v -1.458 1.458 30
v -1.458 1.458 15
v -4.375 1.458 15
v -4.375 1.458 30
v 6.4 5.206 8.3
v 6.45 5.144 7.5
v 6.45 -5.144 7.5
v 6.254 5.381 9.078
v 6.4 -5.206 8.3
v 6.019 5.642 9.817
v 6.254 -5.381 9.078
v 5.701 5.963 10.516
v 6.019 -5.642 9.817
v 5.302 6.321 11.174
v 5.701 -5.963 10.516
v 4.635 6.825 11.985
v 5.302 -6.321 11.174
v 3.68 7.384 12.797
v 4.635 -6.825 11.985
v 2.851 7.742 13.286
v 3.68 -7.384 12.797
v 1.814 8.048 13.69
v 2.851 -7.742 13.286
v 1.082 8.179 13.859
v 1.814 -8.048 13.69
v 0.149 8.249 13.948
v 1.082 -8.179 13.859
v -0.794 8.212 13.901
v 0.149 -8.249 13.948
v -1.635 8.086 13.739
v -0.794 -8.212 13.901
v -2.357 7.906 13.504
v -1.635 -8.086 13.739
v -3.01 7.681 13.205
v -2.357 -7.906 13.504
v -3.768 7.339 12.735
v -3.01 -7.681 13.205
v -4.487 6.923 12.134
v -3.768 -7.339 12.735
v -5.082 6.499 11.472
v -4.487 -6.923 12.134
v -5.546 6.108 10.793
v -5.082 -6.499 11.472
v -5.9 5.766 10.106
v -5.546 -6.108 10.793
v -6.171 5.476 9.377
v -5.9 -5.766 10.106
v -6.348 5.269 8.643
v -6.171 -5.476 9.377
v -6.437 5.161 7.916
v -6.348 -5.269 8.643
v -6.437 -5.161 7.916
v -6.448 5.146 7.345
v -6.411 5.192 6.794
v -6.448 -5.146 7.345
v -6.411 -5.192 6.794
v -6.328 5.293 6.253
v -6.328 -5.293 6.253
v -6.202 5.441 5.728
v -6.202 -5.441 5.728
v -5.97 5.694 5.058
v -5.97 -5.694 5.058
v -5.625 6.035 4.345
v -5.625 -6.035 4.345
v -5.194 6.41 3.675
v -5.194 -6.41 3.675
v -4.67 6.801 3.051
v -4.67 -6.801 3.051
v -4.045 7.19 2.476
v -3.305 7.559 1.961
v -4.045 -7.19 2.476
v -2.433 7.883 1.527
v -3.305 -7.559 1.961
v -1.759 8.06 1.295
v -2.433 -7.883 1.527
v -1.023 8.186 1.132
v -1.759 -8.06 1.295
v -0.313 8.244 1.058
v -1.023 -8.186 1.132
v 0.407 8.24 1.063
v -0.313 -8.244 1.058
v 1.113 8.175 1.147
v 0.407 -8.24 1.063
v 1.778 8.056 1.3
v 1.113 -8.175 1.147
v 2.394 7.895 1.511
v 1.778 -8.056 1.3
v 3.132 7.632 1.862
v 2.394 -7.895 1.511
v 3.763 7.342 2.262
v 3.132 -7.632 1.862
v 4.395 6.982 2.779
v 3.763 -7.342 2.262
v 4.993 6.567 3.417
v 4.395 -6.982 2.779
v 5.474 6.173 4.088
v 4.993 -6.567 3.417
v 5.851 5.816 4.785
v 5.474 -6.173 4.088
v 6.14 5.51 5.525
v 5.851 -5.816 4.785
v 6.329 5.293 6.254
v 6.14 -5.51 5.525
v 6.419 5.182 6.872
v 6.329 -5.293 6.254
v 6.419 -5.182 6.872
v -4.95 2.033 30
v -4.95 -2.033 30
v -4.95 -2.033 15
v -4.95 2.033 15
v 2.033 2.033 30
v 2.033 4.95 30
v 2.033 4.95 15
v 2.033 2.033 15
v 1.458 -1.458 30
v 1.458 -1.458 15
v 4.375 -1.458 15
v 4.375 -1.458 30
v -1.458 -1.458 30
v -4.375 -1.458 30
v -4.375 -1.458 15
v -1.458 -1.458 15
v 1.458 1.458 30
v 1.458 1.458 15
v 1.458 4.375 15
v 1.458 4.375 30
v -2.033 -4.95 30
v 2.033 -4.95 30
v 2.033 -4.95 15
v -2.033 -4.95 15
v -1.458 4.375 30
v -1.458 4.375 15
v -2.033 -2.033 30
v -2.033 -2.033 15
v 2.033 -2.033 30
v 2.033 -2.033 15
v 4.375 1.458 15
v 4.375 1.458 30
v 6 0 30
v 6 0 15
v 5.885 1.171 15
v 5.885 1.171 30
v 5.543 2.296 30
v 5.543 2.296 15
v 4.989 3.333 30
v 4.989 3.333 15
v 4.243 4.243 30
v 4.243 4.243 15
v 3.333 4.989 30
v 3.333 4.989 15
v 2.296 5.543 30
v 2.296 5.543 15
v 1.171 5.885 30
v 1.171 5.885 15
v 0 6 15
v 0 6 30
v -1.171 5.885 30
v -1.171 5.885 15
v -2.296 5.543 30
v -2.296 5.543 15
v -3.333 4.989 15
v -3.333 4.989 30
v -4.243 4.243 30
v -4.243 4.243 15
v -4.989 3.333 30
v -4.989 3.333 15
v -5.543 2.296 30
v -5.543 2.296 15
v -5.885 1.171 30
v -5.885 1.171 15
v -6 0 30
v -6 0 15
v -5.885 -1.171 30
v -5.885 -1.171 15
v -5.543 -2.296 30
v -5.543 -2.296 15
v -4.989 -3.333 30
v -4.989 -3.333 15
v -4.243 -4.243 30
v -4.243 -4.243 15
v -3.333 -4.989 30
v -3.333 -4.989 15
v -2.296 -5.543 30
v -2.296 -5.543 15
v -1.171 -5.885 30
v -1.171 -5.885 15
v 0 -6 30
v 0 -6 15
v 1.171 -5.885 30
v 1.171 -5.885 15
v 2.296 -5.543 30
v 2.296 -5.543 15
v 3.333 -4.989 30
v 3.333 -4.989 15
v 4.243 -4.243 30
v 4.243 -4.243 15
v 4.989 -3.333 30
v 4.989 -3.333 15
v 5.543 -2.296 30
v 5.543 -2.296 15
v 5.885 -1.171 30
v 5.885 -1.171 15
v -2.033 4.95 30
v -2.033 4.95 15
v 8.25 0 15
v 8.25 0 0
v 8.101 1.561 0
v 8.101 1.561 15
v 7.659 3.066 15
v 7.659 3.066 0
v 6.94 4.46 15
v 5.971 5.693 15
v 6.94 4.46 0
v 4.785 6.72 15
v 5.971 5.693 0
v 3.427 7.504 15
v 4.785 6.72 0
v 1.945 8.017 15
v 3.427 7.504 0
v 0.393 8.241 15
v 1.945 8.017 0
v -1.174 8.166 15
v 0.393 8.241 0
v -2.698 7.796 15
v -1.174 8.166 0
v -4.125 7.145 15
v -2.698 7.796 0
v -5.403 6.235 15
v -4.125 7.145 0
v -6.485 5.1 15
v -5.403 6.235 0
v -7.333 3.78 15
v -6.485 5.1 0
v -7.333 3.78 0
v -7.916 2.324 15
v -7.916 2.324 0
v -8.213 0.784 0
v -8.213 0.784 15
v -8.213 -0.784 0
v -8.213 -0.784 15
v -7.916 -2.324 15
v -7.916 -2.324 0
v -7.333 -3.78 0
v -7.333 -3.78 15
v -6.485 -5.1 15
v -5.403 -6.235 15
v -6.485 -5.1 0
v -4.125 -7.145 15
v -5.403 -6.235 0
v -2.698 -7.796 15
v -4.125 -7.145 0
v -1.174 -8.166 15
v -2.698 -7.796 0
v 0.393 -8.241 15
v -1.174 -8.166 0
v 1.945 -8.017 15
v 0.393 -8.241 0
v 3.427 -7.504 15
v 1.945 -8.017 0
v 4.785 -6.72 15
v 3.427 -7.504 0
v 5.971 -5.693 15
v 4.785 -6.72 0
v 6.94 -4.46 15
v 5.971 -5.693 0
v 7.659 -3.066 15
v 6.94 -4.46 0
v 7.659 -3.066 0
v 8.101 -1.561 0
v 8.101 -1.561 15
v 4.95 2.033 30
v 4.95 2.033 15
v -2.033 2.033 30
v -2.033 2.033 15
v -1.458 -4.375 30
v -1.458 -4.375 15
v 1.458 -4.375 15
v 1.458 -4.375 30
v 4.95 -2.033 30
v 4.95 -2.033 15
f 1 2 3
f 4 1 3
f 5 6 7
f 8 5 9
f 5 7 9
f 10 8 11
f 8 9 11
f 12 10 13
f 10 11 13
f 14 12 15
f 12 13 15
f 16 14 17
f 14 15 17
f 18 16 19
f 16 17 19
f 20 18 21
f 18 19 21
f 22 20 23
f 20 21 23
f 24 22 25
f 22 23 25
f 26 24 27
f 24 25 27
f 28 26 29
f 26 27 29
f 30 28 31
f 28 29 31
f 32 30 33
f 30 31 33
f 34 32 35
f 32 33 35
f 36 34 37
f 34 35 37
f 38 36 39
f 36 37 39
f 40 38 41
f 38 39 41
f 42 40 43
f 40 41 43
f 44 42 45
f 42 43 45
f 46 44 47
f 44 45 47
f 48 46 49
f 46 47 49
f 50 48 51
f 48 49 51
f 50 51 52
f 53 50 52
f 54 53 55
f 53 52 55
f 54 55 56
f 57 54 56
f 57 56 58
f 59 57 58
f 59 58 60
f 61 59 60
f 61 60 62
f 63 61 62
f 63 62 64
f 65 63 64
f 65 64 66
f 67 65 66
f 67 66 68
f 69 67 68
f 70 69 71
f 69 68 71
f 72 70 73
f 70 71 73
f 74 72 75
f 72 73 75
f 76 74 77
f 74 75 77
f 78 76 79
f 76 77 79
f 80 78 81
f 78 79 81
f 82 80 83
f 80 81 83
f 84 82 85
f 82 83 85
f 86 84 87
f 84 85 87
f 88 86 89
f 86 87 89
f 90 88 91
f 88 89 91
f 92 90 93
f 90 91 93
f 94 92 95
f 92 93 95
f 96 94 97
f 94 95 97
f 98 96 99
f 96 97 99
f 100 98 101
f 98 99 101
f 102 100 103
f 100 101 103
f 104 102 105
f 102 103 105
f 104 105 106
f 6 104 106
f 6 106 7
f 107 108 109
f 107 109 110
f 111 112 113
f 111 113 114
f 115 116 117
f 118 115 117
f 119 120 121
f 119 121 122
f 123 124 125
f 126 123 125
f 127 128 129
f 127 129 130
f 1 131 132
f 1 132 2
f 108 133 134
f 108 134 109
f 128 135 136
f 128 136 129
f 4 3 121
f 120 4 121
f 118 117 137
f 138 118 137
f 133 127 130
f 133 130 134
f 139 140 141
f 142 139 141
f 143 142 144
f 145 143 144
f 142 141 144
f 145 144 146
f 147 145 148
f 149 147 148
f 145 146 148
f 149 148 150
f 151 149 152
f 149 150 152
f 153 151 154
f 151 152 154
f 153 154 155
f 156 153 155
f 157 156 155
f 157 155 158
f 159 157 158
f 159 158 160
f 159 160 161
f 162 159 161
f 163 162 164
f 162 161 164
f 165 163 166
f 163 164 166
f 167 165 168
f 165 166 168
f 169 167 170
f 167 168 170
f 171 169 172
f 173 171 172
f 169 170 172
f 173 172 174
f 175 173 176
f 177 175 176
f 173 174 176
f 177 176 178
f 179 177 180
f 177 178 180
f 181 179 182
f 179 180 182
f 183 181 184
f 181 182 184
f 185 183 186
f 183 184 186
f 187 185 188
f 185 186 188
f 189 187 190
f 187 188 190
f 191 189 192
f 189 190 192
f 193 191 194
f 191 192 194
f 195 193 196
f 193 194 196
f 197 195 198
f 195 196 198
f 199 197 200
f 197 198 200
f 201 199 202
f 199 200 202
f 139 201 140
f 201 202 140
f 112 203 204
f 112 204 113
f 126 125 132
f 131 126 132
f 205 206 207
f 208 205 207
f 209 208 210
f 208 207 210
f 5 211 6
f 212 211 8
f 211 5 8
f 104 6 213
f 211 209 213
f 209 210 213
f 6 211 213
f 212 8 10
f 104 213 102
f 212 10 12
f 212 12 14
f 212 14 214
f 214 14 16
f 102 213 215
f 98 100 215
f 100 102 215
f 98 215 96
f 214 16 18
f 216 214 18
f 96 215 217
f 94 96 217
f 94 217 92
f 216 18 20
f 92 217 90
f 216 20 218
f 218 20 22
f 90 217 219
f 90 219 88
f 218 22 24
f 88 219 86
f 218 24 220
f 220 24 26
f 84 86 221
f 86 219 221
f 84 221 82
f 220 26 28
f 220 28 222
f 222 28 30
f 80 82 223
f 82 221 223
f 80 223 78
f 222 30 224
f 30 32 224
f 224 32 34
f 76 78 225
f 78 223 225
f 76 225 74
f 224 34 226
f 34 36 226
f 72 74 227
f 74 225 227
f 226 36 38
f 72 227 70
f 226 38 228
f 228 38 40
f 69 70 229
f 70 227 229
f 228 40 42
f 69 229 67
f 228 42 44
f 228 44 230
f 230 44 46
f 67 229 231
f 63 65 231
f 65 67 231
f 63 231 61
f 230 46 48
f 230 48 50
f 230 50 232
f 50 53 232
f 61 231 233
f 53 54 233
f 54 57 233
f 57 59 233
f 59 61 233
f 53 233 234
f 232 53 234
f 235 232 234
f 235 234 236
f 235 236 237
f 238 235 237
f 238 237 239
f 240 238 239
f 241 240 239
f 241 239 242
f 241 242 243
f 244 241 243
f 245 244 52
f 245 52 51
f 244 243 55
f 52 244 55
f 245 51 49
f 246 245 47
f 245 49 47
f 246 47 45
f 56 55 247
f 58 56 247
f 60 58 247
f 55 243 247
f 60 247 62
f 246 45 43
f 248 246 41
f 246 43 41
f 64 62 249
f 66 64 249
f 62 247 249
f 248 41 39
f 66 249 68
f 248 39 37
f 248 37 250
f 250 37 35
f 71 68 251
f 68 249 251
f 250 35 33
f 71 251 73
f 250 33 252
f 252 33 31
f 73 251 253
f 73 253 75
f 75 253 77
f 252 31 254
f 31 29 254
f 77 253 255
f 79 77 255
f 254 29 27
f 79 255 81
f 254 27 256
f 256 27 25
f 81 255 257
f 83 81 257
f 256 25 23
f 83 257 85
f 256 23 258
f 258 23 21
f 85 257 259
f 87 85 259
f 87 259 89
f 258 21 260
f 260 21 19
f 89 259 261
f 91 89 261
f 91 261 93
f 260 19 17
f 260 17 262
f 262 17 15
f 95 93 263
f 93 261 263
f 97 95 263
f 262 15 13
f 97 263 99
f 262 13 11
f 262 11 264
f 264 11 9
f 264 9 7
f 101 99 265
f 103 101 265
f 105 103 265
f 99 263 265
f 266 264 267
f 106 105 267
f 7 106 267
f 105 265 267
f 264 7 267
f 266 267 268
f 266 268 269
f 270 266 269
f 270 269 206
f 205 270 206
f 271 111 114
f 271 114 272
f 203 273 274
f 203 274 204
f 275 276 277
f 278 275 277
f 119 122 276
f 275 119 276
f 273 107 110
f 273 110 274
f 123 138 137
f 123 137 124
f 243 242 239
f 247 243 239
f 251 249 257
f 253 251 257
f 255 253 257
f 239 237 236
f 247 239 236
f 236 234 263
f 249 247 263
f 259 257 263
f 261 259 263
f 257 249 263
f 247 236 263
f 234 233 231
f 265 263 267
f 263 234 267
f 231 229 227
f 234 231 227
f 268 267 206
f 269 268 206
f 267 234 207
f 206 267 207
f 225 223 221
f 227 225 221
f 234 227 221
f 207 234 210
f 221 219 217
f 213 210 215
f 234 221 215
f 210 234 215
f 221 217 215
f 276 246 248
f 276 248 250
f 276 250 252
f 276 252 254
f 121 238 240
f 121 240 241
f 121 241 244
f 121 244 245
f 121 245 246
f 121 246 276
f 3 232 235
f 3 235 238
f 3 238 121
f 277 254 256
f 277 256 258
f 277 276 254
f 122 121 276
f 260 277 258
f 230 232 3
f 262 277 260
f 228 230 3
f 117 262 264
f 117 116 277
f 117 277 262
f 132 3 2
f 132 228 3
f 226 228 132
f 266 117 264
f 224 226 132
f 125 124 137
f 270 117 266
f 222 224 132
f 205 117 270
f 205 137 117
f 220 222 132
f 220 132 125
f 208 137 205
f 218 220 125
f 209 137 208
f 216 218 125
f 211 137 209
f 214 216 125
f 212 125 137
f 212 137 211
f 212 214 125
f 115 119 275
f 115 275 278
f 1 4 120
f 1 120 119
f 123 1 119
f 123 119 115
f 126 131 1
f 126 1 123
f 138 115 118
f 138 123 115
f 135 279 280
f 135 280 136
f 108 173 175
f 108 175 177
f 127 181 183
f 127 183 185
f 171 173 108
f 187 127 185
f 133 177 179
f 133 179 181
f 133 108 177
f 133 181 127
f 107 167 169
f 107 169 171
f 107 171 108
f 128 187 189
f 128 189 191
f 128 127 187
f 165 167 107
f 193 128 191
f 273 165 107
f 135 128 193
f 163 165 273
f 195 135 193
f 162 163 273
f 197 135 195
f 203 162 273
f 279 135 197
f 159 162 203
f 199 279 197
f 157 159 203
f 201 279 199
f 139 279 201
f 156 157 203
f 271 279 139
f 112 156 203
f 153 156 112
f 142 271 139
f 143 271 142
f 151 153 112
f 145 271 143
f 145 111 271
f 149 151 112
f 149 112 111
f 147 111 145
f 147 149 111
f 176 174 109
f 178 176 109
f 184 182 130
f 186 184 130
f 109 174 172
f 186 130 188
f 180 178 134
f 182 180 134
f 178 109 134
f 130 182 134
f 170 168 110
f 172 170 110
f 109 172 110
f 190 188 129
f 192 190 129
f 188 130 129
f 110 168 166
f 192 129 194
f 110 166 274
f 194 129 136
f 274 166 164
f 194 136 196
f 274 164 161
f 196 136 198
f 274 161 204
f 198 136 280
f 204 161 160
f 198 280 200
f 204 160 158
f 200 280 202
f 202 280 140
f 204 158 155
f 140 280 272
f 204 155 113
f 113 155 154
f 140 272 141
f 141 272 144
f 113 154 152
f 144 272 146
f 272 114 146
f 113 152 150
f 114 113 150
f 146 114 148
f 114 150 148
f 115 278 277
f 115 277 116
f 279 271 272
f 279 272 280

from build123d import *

# Parameters (mm, degrees)
F0_R     = 8.25
F1_DEPTH = 15
F3_DEPTH = 15
F4_R     = 6
F5_DEPTH = 15
F6_R     = 6.45
F7_DEPTH = 12.5


with BuildPart() as f1:
    # F0 (on Top) → F1 (new body)
    with BuildSketch(Plane.XY):
        Circle(F0_R)
    extrude(amount=F1_DEPTH)

    # F2 (on face) → F3 (join)
    with BuildSketch(Plane.XY.offset(15)):
        Polygon((1.458333, 4.375), (-1.458333, 4.375), (-1.458333, 1.458333), (-4.375, 1.458333), (-4.375, -1.458333), (-1.458333, -1.458333), (-1.458333, -4.375), (1.458333, -4.375), (1.458333, -1.458333), (4.375, -1.458333), (4.375, 1.458333), (1.458333, 1.458333), align=None)
    extrude(amount=F3_DEPTH)

    # F6 (on Front) → F7 (cut, symmetric)
    with BuildSketch(Plane.XZ):
        with Locations((0, 7.5)):
            Circle(F6_R)
    extrude(amount=F7_DEPTH, both=True, mode=Mode.SUBTRACT)


with BuildPart() as f5:
    # F4 (on face) → F5 (new body, through all)
    with BuildSketch(Plane.XY.offset(15)):
        Circle(F4_R)
        Polygon((-2.033333, 2.033333), (-2.033333, 4.95), (2.033333, 4.95), (2.033333, 2.033333), (4.95, 2.033333), (4.95, -2.033333), (2.033333, -2.033333), (2.033333, -4.95), (-2.033333, -4.95), (-2.033333, -2.033333), (-4.95, -2.033333), (-4.95, 2.033333), align=None, mode=Mode.SUBTRACT)
    extrude(amount=F5_DEPTH)


solid = Compound([f1.part, f5.part])
